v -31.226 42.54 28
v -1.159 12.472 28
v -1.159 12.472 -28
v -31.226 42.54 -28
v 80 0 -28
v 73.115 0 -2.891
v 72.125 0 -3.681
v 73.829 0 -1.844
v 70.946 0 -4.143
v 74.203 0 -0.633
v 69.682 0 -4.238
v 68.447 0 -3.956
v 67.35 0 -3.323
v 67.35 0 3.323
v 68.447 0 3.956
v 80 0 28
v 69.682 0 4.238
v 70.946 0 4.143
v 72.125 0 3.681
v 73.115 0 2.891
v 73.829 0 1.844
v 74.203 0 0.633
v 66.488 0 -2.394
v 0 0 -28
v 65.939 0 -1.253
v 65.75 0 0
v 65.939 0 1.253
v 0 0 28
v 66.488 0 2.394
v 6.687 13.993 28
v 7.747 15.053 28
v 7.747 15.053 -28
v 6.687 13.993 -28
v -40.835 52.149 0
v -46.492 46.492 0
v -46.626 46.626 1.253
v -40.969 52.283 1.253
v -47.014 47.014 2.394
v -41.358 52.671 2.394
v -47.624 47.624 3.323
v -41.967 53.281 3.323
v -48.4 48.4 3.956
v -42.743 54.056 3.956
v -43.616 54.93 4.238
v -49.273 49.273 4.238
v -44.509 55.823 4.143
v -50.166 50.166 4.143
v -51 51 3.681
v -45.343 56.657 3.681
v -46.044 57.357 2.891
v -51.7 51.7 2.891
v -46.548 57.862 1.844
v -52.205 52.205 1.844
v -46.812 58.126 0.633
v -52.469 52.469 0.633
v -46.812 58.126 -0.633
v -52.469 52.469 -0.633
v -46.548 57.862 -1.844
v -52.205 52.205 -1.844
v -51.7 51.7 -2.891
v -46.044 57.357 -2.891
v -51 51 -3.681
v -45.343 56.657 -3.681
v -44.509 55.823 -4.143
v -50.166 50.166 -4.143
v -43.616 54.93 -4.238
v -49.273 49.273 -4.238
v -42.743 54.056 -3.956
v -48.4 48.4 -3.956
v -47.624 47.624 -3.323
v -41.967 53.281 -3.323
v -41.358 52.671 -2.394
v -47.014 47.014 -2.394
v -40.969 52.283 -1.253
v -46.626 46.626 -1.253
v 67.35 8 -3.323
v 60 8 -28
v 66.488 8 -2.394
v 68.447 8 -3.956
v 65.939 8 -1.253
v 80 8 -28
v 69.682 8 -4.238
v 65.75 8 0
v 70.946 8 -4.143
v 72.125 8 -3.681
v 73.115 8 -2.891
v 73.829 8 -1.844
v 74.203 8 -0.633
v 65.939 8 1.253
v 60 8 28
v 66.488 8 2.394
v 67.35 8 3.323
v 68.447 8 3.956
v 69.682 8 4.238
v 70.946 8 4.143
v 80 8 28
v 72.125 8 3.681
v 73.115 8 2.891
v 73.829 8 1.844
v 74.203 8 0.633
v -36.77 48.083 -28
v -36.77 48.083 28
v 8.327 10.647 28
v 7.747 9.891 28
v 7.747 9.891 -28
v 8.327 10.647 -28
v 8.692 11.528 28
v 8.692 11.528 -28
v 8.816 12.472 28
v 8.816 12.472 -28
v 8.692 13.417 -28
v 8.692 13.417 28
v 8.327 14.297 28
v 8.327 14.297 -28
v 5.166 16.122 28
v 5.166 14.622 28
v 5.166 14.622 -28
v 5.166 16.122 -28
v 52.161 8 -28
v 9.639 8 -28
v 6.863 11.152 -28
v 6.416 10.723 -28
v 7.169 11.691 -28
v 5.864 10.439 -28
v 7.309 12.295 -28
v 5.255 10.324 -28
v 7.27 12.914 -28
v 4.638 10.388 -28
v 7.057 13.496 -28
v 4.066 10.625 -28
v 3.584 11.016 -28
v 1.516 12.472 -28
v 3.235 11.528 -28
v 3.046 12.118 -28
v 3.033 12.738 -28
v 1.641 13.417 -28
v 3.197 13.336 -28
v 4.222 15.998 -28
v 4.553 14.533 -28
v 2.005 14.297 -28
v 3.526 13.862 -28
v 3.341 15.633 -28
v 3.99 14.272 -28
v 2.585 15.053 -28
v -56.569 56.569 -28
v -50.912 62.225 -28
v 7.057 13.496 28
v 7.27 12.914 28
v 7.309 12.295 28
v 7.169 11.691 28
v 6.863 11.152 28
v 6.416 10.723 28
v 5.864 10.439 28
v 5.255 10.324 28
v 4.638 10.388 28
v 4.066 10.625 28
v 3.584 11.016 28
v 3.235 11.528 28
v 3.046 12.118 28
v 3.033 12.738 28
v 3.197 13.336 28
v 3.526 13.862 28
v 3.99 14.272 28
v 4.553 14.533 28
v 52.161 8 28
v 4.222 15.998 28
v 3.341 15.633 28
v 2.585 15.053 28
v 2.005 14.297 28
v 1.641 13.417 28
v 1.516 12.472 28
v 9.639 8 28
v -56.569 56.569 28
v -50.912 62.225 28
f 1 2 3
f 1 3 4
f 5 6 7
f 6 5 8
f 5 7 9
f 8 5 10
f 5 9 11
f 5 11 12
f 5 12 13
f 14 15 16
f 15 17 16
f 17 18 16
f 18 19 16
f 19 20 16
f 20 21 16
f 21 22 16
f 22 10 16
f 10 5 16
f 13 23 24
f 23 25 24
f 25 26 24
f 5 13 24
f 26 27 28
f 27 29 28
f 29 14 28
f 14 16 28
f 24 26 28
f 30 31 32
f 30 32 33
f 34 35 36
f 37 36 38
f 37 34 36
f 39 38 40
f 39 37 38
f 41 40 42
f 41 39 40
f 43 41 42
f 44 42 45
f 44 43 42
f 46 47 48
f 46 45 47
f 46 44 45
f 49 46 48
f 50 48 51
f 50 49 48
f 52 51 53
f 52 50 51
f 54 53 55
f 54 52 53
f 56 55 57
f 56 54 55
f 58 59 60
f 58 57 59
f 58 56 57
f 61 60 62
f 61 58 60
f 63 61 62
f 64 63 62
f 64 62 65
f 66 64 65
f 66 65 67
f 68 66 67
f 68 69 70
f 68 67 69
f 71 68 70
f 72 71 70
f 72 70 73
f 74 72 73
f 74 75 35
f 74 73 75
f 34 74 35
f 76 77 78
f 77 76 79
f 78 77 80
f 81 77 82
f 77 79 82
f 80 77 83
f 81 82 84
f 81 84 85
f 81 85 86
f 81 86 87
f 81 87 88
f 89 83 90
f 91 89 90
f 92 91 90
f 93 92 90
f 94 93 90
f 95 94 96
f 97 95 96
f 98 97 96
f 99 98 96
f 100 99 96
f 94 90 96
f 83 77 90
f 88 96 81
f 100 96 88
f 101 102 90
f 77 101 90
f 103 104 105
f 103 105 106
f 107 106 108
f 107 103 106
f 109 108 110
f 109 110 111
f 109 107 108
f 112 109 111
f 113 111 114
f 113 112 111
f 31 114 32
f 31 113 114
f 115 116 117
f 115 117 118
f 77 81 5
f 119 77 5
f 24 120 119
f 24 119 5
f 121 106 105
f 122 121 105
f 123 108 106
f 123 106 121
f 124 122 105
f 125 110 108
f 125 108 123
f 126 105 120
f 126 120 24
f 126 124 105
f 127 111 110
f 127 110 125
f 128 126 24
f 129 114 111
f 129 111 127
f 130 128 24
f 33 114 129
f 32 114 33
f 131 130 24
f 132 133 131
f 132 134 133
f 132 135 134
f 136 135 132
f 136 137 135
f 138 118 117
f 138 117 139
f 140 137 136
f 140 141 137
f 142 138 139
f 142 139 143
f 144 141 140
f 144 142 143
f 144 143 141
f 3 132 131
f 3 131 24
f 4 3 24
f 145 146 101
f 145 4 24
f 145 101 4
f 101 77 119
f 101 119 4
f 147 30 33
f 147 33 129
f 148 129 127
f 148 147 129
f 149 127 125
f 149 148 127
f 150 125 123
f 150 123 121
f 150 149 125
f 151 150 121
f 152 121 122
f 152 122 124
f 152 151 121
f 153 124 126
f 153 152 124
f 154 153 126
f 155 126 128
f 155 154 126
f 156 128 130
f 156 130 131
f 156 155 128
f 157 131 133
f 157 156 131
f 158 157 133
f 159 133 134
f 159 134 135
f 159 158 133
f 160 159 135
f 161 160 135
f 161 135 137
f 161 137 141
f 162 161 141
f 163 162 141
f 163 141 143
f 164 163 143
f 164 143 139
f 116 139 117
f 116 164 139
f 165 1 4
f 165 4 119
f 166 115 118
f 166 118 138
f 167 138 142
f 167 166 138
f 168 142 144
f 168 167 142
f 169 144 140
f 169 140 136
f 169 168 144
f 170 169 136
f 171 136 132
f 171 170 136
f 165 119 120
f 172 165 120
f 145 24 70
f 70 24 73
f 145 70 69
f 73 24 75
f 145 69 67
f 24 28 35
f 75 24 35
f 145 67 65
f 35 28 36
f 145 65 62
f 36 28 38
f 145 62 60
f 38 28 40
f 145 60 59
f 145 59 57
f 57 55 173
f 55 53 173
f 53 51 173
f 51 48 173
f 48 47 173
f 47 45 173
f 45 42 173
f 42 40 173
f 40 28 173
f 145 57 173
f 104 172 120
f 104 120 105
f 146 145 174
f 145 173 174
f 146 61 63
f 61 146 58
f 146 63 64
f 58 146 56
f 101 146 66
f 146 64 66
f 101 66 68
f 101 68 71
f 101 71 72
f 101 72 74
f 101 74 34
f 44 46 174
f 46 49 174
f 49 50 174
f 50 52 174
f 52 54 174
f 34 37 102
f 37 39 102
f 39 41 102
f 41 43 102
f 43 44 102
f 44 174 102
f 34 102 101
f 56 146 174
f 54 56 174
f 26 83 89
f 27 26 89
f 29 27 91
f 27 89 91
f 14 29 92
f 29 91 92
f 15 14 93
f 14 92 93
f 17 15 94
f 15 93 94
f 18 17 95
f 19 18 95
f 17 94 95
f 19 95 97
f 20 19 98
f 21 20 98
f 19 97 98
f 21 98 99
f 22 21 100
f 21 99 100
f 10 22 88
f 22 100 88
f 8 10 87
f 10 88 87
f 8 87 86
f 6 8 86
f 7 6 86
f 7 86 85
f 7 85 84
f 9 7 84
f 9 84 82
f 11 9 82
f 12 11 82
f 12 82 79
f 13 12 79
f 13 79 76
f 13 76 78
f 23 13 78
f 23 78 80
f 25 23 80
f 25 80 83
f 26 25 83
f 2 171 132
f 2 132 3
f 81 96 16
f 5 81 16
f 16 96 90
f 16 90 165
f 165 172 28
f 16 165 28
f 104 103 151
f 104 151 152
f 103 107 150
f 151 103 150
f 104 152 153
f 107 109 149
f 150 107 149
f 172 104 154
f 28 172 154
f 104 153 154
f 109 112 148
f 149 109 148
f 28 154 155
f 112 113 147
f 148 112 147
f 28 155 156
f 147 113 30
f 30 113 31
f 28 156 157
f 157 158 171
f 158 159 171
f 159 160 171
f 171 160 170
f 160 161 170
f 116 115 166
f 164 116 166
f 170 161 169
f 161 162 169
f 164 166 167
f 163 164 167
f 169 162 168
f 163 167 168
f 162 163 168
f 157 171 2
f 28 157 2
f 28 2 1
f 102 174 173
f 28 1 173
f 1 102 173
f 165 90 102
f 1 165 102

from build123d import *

# Parameters (mm, degrees)
EXTRUDE_1_DEPTH     = 28
SKETCH_3_R          = 4.25
CUT_EXTRUDE_1_DEPTH = 101.620045975


with BuildPart() as part:
    # 草图1 → 凸台-拉伸1 (new, symmetric)
    with BuildSketch(Plane.XY):
        Polygon((80, 0), (0, 0), (-56.568542495, 56.568542495), (-50.911688245, 62.225396744), (-36.769552622, 48.083261121), (60, 8), (80, 8), align=None)
        with BuildLine():
            Line((52.160622211, 8), (9.638600026, 8))
            Line((9.638600026, 8), (7.747166088, 9.891433938))
            ThreePointArc((7.747166088, 9.891433938), (8.816226337, 12.472373689), (7.747166088, 15.05331344))
            Line((7.747166088, 15.05331344), (6.686505916, 13.992653268))
            ThreePointArc((6.686505916, 13.992653268), (4.343456957, 10.486032694), (5.166226337, 14.622373689))
            Line((5.166226337, 14.622373689), (5.166226337, 16.122373689))
            ThreePointArc((5.166226337, 16.122373689), (2.585286586, 15.05331344), (1.516226337, 12.472373689))
            Line((1.516226337, 12.472373689), (-1.15866519, 12.472373689))
            Line((-1.15866519, 12.472373689), (-31.226275427, 42.539983926))
            Line((-31.226275427, 42.539983926), (52.160622211, 8))
        make_face(mode=Mode.SUBTRACT)
    extrude(amount=EXTRUDE_1_DEPTH, both=True)

    # 草图3 → 切除-拉伸1 (cut, through all)
    with BuildSketch(Plane(origin=(0, 8, 0), x_dir=(1, 0, 0), z_dir=(0, 1, 0))):
        with Locations(Location((70, 0, 0), (0, 0, 180))):
            Circle(SKETCH_3_R)
    cut_extrude_1 = extrude(amount=-CUT_EXTRUDE_1_DEPTH, mode=Mode.SUBTRACT)

    # 镜向1: 切除-拉伸1 across plane
    add(cut_extrude_1.mirror(Plane(origin=(0, 0, 0), x_dir=(0, 0, 1), z_dir=(-0.9238795325112867, 0.3826834323650898, 0))), mode=Mode.SUBTRACT)


solid = part.part
